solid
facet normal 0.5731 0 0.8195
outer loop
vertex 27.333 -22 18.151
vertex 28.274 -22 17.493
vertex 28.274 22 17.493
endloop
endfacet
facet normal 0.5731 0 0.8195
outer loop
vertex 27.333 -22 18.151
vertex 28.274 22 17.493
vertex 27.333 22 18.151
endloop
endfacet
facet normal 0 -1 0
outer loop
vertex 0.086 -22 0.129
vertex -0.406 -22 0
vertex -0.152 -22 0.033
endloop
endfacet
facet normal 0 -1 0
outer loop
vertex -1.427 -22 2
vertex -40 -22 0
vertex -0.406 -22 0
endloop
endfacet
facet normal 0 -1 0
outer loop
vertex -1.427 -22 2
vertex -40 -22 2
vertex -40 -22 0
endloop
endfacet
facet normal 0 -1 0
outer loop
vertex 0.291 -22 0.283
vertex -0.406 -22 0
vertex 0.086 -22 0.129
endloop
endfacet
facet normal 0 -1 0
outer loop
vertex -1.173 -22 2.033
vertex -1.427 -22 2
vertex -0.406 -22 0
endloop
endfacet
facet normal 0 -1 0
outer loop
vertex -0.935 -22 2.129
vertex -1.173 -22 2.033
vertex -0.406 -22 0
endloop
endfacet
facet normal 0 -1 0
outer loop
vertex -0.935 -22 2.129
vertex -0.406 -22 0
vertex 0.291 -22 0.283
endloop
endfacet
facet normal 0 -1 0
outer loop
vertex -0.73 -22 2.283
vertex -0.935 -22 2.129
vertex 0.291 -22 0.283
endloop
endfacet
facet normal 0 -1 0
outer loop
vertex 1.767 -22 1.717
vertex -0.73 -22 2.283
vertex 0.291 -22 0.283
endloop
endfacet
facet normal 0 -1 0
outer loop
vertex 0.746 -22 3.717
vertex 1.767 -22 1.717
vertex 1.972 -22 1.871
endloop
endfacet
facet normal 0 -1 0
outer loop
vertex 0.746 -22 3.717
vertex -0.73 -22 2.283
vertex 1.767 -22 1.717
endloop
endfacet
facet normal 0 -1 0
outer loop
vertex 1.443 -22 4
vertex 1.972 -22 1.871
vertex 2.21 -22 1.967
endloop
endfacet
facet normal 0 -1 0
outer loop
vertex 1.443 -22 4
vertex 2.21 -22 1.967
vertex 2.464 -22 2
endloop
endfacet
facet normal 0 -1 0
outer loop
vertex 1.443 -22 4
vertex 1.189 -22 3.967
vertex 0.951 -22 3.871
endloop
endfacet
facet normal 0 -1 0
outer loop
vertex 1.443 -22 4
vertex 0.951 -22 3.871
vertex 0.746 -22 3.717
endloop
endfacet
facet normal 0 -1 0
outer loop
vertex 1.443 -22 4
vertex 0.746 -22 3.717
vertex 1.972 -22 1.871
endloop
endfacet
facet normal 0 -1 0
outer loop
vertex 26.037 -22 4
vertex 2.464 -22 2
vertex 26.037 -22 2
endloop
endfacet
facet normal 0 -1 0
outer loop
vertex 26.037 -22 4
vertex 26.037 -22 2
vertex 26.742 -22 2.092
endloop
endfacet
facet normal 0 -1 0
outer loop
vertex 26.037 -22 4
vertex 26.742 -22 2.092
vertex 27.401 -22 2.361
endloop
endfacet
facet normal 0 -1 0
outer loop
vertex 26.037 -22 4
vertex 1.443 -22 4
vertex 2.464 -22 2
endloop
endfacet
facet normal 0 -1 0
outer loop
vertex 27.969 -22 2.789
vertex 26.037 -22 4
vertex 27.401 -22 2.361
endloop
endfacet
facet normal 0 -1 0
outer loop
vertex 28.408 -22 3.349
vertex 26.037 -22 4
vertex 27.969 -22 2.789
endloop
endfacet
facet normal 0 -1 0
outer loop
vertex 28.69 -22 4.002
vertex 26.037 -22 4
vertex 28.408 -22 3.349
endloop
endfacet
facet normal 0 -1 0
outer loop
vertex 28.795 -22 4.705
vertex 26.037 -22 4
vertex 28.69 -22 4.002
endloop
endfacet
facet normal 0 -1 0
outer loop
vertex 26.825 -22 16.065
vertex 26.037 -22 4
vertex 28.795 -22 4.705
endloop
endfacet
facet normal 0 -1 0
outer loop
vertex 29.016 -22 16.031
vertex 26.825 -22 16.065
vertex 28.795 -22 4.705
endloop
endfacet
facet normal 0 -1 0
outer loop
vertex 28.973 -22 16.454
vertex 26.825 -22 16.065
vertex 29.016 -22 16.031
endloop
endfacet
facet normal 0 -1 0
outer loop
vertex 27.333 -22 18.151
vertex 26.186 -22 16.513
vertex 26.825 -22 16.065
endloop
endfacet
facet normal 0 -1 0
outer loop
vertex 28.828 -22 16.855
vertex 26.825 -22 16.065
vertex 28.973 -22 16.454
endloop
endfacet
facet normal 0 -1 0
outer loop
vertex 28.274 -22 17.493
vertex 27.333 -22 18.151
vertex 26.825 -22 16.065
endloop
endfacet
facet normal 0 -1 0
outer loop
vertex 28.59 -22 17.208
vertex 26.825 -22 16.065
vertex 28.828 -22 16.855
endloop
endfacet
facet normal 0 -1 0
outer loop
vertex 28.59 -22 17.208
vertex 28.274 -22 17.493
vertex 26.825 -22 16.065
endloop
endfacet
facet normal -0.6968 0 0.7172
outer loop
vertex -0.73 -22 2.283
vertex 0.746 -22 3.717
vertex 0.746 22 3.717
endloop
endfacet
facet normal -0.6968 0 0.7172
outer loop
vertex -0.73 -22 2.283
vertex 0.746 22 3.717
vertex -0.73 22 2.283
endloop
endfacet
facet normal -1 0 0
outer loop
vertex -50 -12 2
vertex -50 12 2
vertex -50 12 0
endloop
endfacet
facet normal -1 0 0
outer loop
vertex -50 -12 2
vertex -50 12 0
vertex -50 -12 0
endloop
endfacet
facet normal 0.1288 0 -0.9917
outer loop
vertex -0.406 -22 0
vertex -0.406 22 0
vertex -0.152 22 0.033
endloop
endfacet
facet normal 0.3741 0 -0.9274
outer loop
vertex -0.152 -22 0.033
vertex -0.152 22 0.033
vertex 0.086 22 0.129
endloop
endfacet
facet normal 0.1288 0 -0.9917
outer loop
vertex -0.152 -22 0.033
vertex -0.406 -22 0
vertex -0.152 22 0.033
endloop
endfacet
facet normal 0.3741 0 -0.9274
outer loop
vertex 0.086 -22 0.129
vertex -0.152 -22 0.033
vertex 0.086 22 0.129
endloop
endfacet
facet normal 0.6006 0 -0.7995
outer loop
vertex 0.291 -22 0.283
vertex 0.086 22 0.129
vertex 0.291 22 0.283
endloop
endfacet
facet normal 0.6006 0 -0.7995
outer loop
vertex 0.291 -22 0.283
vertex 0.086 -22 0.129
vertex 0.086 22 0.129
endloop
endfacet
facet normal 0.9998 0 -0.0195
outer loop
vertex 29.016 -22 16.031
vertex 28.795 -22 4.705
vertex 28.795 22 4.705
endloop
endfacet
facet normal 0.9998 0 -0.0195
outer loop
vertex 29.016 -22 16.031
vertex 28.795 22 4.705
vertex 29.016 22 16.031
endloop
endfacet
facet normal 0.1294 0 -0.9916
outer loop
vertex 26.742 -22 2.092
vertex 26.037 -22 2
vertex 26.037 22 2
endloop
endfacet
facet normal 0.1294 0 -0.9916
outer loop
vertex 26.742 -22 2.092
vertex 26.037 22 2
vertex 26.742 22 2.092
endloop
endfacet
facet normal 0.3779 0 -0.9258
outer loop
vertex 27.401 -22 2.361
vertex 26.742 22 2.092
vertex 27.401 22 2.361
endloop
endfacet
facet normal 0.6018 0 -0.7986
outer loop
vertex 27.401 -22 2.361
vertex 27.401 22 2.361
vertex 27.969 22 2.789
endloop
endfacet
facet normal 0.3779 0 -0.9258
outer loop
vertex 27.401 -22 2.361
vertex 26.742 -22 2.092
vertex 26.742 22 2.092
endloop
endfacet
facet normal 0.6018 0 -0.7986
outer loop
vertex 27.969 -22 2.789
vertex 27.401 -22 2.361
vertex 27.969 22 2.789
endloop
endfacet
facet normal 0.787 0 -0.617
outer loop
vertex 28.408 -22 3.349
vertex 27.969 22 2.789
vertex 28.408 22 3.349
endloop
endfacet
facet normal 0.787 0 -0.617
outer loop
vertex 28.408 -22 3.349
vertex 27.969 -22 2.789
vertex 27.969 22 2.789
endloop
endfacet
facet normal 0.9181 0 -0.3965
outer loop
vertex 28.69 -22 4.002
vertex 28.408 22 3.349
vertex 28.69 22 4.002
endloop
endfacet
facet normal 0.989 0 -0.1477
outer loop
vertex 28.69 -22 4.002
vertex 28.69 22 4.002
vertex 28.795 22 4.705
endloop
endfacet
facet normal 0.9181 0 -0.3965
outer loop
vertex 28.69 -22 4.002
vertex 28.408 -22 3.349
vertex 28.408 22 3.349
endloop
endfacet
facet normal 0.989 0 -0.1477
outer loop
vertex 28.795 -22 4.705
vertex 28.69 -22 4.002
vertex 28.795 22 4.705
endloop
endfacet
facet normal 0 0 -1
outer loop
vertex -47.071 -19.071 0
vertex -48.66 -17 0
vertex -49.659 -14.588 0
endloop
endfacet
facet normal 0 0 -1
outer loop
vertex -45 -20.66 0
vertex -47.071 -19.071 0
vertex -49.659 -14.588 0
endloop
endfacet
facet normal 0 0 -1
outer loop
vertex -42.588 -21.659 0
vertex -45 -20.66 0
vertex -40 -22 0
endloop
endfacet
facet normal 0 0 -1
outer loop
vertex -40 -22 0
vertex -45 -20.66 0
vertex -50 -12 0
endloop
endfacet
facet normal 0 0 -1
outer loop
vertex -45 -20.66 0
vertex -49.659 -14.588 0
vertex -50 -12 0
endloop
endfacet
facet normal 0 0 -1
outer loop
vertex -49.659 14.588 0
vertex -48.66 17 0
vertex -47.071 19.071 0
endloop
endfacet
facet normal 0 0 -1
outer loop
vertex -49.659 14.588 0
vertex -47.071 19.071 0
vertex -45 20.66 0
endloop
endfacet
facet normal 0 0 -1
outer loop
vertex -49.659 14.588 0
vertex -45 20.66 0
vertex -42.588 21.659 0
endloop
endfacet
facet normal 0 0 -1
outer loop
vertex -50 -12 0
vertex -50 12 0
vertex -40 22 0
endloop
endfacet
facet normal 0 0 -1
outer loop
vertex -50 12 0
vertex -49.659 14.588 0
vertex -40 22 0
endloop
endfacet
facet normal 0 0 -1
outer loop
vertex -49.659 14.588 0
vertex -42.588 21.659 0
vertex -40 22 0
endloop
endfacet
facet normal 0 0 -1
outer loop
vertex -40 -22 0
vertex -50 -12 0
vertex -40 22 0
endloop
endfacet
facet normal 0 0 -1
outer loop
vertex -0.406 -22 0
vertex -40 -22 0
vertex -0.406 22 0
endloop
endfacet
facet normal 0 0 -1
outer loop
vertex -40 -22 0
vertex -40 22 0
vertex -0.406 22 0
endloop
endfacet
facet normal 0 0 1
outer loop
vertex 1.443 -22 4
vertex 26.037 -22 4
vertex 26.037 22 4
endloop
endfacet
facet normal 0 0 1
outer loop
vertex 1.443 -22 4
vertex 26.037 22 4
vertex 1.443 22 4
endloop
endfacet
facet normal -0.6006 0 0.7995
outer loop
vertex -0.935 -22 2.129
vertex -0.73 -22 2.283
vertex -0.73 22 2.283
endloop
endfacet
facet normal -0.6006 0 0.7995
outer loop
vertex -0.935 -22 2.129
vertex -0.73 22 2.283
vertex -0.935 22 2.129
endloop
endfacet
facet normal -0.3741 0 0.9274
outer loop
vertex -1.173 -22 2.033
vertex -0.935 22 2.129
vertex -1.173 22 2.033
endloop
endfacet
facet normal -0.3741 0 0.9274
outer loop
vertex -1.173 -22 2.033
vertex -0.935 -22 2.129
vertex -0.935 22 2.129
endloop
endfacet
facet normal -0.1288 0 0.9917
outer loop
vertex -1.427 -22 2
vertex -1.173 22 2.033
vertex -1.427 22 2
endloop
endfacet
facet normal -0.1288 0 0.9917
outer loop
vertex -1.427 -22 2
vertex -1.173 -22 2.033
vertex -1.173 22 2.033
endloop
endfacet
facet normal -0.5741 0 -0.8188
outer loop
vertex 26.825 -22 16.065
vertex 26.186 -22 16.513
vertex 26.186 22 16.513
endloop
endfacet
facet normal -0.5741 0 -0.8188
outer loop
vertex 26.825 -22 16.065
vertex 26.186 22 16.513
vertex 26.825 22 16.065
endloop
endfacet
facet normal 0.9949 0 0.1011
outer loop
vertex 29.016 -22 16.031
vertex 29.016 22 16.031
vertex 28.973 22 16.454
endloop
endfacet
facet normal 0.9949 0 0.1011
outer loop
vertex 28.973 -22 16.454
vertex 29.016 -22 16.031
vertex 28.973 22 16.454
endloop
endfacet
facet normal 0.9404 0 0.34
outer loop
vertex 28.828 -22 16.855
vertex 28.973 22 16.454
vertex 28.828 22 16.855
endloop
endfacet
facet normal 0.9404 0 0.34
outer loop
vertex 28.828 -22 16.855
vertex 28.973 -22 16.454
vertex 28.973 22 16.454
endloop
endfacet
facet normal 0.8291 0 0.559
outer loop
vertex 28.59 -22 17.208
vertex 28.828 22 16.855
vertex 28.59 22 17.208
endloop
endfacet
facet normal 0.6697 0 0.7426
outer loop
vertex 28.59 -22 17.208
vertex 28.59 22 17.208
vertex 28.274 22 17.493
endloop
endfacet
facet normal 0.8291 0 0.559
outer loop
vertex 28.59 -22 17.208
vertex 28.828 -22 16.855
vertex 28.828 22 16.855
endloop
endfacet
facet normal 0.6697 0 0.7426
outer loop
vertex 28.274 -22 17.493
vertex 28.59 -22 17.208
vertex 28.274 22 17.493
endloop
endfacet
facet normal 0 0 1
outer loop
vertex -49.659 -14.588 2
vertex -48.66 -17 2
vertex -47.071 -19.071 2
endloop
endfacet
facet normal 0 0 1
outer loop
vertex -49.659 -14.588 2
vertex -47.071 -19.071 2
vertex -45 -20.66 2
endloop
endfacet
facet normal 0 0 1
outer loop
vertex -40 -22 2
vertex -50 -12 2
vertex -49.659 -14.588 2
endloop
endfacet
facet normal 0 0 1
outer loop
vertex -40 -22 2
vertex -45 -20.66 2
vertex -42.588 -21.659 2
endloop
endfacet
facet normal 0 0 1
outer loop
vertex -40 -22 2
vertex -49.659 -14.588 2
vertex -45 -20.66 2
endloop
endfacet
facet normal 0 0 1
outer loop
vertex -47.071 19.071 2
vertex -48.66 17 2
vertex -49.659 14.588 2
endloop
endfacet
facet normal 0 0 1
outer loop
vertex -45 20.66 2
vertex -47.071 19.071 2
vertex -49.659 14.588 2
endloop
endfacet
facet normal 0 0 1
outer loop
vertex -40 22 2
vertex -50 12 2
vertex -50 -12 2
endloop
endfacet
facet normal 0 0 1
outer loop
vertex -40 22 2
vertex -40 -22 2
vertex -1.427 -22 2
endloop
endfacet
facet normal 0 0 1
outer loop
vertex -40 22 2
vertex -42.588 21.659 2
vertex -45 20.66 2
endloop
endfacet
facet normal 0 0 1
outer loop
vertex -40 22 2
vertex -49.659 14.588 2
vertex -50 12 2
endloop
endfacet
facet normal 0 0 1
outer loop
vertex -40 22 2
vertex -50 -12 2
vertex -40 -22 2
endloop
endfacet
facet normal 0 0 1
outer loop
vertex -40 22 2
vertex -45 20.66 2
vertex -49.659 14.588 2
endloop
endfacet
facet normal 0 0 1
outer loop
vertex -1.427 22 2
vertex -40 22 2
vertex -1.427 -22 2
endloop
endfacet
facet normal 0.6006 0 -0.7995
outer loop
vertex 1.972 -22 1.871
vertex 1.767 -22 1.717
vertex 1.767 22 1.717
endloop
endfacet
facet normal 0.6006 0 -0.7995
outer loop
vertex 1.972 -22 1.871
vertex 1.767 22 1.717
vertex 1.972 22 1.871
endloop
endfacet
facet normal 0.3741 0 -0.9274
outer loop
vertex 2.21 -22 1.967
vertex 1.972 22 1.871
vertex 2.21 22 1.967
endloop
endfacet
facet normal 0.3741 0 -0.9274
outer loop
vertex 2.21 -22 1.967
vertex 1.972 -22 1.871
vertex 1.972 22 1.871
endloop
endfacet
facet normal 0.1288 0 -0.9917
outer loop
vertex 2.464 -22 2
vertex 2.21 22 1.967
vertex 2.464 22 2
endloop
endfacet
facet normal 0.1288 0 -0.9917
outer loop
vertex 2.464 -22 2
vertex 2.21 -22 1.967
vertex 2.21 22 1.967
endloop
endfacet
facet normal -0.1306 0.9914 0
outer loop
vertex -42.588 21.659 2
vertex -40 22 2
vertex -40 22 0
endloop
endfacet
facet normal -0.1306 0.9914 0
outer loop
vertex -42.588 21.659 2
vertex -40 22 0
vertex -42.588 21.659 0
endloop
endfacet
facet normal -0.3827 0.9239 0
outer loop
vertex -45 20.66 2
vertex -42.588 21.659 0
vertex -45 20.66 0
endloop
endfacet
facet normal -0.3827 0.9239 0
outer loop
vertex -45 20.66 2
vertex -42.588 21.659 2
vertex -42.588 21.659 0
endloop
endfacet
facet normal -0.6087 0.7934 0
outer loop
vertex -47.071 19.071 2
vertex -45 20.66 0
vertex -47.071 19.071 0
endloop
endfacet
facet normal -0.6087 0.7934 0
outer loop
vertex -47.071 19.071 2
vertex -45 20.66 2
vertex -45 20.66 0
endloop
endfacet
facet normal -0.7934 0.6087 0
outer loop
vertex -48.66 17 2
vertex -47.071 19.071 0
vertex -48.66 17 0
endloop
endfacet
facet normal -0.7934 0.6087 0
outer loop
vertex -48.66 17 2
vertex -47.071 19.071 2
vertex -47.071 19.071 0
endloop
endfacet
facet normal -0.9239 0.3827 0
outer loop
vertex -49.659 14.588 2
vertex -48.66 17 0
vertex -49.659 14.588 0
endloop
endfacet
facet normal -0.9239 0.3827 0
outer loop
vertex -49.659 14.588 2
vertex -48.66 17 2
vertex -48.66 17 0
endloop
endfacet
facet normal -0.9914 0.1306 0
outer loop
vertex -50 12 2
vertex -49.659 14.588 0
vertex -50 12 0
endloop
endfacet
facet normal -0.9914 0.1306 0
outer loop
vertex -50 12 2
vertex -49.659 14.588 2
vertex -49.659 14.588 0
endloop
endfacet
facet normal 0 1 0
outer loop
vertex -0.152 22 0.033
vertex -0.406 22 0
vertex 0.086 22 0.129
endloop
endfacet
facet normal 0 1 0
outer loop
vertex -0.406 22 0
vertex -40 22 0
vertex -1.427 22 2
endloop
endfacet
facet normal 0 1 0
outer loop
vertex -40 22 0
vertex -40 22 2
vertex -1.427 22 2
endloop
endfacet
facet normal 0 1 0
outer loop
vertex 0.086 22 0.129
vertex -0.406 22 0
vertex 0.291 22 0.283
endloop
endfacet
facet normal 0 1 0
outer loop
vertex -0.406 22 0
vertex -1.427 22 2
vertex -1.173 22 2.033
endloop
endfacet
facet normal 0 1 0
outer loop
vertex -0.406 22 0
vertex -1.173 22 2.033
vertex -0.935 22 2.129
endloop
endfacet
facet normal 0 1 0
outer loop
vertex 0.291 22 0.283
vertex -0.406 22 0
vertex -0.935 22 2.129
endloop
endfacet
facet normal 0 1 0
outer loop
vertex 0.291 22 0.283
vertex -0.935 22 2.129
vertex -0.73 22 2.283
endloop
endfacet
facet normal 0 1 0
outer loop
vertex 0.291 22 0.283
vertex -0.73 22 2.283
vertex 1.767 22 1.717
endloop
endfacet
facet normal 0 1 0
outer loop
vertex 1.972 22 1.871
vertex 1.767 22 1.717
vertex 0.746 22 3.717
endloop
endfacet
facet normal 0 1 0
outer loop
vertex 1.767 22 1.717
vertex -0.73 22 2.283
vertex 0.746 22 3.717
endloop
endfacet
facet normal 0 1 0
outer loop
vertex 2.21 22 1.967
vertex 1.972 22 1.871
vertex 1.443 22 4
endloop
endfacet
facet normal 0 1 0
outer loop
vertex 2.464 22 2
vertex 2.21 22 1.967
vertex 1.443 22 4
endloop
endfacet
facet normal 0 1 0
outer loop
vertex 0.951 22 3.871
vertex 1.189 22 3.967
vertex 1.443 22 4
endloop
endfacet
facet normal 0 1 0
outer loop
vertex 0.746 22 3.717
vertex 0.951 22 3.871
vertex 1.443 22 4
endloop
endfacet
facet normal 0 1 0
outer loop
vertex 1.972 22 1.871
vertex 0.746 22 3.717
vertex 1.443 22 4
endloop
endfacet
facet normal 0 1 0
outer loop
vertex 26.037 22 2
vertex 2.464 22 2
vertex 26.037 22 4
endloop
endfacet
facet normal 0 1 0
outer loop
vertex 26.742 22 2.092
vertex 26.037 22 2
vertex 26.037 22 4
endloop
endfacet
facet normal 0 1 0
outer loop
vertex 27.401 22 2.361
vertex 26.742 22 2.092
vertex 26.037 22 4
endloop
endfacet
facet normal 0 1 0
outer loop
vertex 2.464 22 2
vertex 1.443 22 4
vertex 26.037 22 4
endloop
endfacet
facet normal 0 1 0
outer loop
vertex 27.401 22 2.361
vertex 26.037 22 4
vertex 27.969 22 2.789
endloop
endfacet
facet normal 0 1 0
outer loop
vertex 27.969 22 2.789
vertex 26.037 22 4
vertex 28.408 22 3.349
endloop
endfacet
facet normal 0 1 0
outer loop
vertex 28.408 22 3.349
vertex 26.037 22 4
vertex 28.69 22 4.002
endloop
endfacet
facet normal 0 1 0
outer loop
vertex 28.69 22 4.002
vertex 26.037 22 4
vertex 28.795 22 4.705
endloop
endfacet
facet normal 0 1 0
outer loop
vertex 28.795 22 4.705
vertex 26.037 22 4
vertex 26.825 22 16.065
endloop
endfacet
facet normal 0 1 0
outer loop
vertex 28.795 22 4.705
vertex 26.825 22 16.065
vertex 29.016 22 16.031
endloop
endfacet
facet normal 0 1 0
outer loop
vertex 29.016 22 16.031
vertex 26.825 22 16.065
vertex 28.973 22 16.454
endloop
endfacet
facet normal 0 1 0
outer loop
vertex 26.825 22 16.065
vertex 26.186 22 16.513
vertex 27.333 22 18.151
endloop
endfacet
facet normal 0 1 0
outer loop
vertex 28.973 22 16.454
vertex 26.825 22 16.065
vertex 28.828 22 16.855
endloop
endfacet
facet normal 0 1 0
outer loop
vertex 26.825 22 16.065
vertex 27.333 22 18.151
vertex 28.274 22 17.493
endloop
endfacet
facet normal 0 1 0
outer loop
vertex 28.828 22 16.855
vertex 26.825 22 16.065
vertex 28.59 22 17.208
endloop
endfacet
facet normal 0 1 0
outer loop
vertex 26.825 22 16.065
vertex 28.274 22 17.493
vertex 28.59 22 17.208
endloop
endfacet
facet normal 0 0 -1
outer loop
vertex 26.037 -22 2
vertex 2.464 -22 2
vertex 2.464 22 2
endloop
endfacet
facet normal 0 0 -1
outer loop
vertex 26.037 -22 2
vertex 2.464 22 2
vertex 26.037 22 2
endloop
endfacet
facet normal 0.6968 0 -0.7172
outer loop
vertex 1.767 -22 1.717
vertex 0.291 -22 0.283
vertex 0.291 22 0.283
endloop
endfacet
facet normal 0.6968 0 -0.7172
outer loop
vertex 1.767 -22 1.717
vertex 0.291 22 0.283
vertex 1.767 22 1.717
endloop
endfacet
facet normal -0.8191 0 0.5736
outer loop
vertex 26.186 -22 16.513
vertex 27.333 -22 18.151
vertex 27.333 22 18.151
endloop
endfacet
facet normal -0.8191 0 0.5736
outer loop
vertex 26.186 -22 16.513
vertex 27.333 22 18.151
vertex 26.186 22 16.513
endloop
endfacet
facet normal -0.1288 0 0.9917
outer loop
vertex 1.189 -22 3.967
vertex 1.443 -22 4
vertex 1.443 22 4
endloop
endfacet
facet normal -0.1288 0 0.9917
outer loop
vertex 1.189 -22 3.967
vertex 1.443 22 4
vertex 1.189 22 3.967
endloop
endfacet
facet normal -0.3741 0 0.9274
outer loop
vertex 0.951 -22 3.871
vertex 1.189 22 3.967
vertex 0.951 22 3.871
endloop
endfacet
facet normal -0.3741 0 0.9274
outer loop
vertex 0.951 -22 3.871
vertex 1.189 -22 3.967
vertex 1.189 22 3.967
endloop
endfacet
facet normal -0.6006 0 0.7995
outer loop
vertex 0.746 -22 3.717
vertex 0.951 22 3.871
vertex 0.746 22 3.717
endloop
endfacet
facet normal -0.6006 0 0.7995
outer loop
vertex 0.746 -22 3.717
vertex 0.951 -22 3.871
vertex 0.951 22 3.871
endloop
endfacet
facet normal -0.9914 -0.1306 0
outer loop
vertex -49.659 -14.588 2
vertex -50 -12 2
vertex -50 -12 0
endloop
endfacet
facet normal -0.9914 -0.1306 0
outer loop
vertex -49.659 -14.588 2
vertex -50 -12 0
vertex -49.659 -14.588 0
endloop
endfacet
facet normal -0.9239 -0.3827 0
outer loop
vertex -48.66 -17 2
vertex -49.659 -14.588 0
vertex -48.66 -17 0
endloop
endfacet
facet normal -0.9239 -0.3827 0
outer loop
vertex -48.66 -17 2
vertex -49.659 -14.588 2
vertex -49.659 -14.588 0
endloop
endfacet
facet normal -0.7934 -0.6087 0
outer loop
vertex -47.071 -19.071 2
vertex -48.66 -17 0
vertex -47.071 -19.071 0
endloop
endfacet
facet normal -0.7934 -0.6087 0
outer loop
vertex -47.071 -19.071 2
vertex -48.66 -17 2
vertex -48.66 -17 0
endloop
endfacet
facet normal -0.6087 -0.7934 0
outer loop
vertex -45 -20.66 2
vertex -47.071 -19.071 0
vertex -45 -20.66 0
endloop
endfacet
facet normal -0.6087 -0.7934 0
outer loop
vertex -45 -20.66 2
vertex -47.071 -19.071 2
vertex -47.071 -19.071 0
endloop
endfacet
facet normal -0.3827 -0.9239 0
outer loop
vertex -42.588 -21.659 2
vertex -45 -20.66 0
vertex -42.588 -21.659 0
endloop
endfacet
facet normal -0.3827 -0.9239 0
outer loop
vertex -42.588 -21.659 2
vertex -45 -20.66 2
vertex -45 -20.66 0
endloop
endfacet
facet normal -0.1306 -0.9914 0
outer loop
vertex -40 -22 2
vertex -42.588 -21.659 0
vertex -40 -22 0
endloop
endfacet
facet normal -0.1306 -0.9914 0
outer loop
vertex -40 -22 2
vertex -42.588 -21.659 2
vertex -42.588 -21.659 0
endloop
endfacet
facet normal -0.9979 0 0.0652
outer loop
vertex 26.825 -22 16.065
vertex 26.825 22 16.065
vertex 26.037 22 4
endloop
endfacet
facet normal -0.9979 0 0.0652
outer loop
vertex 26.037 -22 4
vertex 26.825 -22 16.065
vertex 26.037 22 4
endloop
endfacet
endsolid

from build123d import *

# Parameters (mm, degrees)
F1_DEPTH = 22
F3_DEPTH = 2


with BuildPart() as f1:
    # F0 (on Front) → F1 (new body, symmetric)
    with BuildSketch(Plane.XZ):
        with BuildLine():
            Line((-40, 0), (-0.4058661959, 0))
            ThreePointArc((-0.4058661959, 0), (-0.0297944203, 0.073409465), (0.2910628996, 0.2828599608))
            Line((0.2910628996, 0.2828599608), (1.7669371004, 1.7171400392))
            ThreePointArc((1.7669371004, 1.7171400392), (2.0877944203, 1.926590535), (2.4638661959, 2))
            Line((2.4638661959, 2), (26.037, 2))
            ThreePointArc((26.037, 2), (27.9687843496, 2.7891547709), (28.7954749436, 4.705176349))
            Line((28.7954749436, 4.705176349), (29.016465998, 16.0310205539))
            ThreePointArc((29.016465998, 16.0310205539), (28.8276722638, 16.8546583092), (28.2736767263, 17.4927109486))
            Line((28.2736767263, 17.4927109486), (27.3333525812, 18.1512658075))
            Line((27.3333525812, 18.1512658075), (26.1860444646, 16.5130704329))
            Line((26.1860444646, 16.5130704329), (26.8254471929, 16.0652655182))
            Line((26.8254471929, 16.0652655182), (26.037, 4))
            Line((26.037, 4), (1.4428661959, 4))
            ThreePointArc((1.4428661959, 4), (1.0667944203, 3.926590535), (0.7459371004, 3.7171400392))
            Line((0.7459371004, 3.7171400392), (-0.7299371004, 2.2828599608))
            ThreePointArc((-0.7299371004, 2.2828599608), (-1.0507944203, 2.073409465), (-1.4268661959, 2))
            Line((-1.4268661959, 2), (-40, 2))
            Line((-40, 2), (-40, 0))
        make_face()
    extrude(amount=F1_DEPTH, both=True)

    # F2 (on face) → F3 (join)
    with BuildSketch(Plane.XY.offset(2)):
        with BuildLine():
            Line((-50, 12), (-50, -12))
            ThreePointArc((-50, -12), (-47.0710678119, -19.0710678119), (-40, -22))
            Line((-40, -22), (-40, 22))
            ThreePointArc((-40, 22), (-47.0710678119, 19.0710678119), (-50, 12))
        make_face()
    extrude(amount=-F3_DEPTH)


solid = f1.part
